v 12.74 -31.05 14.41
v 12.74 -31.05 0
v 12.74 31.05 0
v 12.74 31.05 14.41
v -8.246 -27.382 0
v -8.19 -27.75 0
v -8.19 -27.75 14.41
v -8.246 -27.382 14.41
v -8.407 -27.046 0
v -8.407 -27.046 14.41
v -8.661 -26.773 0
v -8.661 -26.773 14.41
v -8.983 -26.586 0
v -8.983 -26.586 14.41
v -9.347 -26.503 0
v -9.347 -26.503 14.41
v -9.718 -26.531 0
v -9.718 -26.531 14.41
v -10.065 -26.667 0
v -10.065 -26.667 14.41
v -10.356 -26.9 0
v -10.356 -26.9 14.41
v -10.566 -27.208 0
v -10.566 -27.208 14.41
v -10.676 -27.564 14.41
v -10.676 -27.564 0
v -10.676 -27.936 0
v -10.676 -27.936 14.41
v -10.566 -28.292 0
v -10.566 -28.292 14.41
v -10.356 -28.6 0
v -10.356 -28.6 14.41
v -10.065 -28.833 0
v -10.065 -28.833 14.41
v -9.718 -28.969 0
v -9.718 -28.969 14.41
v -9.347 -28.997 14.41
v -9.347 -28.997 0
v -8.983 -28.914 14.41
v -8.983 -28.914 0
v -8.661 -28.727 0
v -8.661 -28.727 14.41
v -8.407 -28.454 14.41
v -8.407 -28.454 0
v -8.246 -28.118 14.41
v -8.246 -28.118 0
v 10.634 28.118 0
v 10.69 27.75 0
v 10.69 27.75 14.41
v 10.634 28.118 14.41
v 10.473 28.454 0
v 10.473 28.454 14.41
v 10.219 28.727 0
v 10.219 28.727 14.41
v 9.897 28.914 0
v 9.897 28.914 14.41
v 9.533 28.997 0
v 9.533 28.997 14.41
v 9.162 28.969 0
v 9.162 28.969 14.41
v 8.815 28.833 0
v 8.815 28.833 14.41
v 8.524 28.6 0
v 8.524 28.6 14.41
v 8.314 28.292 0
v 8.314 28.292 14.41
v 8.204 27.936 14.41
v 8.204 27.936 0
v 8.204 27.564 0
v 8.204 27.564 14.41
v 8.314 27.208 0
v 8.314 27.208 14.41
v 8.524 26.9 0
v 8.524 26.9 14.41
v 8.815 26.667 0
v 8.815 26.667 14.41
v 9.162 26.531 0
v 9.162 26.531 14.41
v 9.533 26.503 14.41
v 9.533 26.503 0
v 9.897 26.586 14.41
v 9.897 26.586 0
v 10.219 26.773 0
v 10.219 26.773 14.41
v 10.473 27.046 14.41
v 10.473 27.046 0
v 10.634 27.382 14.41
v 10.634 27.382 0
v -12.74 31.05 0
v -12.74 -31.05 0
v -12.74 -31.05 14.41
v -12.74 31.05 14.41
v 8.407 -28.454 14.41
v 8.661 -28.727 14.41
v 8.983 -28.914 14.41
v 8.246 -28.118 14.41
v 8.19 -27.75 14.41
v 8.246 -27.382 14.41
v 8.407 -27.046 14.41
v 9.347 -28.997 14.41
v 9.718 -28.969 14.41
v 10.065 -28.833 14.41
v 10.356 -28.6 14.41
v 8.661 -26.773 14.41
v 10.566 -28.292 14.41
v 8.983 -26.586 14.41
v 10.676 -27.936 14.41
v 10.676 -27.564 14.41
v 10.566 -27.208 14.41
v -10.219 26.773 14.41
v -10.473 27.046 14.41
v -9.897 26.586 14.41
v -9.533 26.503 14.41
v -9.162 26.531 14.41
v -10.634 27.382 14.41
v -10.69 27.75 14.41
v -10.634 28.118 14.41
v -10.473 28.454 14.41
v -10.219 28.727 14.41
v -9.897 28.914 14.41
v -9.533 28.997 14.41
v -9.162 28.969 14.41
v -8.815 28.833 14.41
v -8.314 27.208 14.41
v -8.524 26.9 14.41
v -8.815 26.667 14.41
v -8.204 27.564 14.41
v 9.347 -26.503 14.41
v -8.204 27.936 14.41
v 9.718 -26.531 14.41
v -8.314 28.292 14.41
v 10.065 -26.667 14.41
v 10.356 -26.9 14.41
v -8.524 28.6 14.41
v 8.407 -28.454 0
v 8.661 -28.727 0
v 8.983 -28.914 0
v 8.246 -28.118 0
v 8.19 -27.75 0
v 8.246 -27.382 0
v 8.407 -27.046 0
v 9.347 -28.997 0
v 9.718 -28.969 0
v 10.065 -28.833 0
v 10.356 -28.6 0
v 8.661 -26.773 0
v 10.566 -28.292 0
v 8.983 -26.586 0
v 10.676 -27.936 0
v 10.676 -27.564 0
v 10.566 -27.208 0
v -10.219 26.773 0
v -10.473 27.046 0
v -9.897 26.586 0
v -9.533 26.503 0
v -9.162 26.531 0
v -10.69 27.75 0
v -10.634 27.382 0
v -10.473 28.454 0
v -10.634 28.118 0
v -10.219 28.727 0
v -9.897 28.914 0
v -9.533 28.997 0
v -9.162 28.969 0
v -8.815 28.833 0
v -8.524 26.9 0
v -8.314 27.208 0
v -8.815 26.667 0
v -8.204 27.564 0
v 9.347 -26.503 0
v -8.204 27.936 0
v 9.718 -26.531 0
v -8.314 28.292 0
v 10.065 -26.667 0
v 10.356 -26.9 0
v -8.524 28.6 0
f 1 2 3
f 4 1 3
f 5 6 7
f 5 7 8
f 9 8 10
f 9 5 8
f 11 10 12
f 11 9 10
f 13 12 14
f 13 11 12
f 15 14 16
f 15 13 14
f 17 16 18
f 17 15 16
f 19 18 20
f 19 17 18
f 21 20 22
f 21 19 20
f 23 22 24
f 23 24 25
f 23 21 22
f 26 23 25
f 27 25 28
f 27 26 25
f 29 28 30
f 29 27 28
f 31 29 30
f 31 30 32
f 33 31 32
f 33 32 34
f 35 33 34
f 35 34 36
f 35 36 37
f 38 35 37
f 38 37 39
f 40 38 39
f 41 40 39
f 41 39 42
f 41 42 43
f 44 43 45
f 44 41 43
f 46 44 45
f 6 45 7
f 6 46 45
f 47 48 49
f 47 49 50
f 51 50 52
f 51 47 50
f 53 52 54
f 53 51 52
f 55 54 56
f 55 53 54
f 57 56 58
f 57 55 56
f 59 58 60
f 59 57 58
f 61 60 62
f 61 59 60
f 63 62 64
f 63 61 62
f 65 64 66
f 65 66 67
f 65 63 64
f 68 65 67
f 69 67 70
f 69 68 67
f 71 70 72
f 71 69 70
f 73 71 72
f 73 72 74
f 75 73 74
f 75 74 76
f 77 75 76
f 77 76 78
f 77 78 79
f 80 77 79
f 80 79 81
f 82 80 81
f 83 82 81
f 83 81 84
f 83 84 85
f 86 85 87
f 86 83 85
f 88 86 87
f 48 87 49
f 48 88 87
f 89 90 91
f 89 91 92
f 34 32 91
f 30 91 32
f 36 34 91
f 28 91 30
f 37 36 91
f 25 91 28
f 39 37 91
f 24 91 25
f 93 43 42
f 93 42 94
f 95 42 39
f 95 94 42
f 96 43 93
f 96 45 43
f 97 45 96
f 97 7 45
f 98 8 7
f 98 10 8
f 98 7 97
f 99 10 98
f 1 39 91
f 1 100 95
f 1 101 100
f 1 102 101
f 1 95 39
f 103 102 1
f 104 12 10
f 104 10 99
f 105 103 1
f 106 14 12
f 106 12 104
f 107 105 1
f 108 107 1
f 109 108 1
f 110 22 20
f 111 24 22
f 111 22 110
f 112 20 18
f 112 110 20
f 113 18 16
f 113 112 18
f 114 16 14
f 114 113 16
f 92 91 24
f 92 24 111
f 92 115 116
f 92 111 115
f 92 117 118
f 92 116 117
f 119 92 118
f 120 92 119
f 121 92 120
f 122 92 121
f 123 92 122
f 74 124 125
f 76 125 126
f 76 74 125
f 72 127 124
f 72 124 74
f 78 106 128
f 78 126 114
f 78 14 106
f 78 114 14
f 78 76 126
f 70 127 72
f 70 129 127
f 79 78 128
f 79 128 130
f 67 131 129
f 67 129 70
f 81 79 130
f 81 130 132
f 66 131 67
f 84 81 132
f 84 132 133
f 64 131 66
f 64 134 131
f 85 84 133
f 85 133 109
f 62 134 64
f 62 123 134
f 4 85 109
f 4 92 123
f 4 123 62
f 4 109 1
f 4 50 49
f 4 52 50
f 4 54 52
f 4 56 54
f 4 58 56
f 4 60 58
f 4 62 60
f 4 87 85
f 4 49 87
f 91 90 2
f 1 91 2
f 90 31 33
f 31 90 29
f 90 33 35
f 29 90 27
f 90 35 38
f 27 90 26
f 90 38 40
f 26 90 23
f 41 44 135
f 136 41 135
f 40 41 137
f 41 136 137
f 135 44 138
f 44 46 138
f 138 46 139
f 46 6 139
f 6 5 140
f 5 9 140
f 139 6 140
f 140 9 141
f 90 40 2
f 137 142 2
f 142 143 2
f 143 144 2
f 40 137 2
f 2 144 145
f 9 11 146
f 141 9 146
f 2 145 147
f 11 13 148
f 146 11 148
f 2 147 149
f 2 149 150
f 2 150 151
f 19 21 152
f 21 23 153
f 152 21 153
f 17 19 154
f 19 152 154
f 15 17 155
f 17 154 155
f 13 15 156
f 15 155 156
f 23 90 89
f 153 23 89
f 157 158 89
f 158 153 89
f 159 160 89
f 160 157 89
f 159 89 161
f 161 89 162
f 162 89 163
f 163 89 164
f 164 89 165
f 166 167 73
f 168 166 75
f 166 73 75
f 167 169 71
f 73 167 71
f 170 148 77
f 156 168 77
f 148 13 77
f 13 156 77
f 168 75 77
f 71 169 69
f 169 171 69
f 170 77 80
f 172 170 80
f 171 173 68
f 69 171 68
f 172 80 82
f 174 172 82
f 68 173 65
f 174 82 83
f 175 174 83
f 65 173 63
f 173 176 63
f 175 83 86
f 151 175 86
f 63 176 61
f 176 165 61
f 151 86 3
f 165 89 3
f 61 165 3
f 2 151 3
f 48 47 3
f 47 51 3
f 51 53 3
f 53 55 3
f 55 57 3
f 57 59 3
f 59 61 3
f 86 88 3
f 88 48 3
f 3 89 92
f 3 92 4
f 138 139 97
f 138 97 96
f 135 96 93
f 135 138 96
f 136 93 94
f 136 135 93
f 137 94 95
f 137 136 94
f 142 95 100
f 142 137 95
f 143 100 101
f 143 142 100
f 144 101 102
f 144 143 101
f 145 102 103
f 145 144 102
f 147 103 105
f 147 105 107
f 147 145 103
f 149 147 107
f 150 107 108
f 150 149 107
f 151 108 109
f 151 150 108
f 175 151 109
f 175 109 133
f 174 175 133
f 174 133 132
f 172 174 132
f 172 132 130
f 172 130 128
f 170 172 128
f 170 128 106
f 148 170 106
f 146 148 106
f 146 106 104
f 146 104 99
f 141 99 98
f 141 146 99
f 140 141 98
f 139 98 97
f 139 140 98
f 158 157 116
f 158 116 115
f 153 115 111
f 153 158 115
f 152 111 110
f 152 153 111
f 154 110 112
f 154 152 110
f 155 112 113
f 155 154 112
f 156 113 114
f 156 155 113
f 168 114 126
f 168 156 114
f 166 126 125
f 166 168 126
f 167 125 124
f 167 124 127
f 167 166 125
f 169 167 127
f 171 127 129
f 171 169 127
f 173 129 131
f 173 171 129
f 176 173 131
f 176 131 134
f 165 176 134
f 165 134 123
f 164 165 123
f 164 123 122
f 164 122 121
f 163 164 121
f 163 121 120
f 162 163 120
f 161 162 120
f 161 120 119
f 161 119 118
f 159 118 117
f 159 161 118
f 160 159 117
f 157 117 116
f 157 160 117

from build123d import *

# Parameters (mm, degrees)
SKETCH_1_W      = 25.48
SKETCH_1_H      = 62.1
SKETCH_1_R      = 1.25
EXTRUDE_1_DEPTH = 14.41


with BuildPart() as part:
    # 草圖1 → 填料-伸長1 (new body)
    with BuildSketch(Plane.XY):
        Rectangle(SKETCH_1_W, SKETCH_1_H)
        with Locations((9.44, 27.75)):
            Circle(SKETCH_1_R, mode=Mode.SUBTRACT)
        with Locations(Location((-9.44, 27.75, 0), (0, 0, 180))):
            Circle(SKETCH_1_R, mode=Mode.SUBTRACT)
        with Locations(Location((9.44, -27.75, 0), (0, 0, 180))):
            Circle(SKETCH_1_R, mode=Mode.SUBTRACT)
        with Locations((-9.44, -27.75)):
            Circle(SKETCH_1_R, mode=Mode.SUBTRACT)
    extrude(amount=EXTRUDE_1_DEPTH)


solid = part.part
